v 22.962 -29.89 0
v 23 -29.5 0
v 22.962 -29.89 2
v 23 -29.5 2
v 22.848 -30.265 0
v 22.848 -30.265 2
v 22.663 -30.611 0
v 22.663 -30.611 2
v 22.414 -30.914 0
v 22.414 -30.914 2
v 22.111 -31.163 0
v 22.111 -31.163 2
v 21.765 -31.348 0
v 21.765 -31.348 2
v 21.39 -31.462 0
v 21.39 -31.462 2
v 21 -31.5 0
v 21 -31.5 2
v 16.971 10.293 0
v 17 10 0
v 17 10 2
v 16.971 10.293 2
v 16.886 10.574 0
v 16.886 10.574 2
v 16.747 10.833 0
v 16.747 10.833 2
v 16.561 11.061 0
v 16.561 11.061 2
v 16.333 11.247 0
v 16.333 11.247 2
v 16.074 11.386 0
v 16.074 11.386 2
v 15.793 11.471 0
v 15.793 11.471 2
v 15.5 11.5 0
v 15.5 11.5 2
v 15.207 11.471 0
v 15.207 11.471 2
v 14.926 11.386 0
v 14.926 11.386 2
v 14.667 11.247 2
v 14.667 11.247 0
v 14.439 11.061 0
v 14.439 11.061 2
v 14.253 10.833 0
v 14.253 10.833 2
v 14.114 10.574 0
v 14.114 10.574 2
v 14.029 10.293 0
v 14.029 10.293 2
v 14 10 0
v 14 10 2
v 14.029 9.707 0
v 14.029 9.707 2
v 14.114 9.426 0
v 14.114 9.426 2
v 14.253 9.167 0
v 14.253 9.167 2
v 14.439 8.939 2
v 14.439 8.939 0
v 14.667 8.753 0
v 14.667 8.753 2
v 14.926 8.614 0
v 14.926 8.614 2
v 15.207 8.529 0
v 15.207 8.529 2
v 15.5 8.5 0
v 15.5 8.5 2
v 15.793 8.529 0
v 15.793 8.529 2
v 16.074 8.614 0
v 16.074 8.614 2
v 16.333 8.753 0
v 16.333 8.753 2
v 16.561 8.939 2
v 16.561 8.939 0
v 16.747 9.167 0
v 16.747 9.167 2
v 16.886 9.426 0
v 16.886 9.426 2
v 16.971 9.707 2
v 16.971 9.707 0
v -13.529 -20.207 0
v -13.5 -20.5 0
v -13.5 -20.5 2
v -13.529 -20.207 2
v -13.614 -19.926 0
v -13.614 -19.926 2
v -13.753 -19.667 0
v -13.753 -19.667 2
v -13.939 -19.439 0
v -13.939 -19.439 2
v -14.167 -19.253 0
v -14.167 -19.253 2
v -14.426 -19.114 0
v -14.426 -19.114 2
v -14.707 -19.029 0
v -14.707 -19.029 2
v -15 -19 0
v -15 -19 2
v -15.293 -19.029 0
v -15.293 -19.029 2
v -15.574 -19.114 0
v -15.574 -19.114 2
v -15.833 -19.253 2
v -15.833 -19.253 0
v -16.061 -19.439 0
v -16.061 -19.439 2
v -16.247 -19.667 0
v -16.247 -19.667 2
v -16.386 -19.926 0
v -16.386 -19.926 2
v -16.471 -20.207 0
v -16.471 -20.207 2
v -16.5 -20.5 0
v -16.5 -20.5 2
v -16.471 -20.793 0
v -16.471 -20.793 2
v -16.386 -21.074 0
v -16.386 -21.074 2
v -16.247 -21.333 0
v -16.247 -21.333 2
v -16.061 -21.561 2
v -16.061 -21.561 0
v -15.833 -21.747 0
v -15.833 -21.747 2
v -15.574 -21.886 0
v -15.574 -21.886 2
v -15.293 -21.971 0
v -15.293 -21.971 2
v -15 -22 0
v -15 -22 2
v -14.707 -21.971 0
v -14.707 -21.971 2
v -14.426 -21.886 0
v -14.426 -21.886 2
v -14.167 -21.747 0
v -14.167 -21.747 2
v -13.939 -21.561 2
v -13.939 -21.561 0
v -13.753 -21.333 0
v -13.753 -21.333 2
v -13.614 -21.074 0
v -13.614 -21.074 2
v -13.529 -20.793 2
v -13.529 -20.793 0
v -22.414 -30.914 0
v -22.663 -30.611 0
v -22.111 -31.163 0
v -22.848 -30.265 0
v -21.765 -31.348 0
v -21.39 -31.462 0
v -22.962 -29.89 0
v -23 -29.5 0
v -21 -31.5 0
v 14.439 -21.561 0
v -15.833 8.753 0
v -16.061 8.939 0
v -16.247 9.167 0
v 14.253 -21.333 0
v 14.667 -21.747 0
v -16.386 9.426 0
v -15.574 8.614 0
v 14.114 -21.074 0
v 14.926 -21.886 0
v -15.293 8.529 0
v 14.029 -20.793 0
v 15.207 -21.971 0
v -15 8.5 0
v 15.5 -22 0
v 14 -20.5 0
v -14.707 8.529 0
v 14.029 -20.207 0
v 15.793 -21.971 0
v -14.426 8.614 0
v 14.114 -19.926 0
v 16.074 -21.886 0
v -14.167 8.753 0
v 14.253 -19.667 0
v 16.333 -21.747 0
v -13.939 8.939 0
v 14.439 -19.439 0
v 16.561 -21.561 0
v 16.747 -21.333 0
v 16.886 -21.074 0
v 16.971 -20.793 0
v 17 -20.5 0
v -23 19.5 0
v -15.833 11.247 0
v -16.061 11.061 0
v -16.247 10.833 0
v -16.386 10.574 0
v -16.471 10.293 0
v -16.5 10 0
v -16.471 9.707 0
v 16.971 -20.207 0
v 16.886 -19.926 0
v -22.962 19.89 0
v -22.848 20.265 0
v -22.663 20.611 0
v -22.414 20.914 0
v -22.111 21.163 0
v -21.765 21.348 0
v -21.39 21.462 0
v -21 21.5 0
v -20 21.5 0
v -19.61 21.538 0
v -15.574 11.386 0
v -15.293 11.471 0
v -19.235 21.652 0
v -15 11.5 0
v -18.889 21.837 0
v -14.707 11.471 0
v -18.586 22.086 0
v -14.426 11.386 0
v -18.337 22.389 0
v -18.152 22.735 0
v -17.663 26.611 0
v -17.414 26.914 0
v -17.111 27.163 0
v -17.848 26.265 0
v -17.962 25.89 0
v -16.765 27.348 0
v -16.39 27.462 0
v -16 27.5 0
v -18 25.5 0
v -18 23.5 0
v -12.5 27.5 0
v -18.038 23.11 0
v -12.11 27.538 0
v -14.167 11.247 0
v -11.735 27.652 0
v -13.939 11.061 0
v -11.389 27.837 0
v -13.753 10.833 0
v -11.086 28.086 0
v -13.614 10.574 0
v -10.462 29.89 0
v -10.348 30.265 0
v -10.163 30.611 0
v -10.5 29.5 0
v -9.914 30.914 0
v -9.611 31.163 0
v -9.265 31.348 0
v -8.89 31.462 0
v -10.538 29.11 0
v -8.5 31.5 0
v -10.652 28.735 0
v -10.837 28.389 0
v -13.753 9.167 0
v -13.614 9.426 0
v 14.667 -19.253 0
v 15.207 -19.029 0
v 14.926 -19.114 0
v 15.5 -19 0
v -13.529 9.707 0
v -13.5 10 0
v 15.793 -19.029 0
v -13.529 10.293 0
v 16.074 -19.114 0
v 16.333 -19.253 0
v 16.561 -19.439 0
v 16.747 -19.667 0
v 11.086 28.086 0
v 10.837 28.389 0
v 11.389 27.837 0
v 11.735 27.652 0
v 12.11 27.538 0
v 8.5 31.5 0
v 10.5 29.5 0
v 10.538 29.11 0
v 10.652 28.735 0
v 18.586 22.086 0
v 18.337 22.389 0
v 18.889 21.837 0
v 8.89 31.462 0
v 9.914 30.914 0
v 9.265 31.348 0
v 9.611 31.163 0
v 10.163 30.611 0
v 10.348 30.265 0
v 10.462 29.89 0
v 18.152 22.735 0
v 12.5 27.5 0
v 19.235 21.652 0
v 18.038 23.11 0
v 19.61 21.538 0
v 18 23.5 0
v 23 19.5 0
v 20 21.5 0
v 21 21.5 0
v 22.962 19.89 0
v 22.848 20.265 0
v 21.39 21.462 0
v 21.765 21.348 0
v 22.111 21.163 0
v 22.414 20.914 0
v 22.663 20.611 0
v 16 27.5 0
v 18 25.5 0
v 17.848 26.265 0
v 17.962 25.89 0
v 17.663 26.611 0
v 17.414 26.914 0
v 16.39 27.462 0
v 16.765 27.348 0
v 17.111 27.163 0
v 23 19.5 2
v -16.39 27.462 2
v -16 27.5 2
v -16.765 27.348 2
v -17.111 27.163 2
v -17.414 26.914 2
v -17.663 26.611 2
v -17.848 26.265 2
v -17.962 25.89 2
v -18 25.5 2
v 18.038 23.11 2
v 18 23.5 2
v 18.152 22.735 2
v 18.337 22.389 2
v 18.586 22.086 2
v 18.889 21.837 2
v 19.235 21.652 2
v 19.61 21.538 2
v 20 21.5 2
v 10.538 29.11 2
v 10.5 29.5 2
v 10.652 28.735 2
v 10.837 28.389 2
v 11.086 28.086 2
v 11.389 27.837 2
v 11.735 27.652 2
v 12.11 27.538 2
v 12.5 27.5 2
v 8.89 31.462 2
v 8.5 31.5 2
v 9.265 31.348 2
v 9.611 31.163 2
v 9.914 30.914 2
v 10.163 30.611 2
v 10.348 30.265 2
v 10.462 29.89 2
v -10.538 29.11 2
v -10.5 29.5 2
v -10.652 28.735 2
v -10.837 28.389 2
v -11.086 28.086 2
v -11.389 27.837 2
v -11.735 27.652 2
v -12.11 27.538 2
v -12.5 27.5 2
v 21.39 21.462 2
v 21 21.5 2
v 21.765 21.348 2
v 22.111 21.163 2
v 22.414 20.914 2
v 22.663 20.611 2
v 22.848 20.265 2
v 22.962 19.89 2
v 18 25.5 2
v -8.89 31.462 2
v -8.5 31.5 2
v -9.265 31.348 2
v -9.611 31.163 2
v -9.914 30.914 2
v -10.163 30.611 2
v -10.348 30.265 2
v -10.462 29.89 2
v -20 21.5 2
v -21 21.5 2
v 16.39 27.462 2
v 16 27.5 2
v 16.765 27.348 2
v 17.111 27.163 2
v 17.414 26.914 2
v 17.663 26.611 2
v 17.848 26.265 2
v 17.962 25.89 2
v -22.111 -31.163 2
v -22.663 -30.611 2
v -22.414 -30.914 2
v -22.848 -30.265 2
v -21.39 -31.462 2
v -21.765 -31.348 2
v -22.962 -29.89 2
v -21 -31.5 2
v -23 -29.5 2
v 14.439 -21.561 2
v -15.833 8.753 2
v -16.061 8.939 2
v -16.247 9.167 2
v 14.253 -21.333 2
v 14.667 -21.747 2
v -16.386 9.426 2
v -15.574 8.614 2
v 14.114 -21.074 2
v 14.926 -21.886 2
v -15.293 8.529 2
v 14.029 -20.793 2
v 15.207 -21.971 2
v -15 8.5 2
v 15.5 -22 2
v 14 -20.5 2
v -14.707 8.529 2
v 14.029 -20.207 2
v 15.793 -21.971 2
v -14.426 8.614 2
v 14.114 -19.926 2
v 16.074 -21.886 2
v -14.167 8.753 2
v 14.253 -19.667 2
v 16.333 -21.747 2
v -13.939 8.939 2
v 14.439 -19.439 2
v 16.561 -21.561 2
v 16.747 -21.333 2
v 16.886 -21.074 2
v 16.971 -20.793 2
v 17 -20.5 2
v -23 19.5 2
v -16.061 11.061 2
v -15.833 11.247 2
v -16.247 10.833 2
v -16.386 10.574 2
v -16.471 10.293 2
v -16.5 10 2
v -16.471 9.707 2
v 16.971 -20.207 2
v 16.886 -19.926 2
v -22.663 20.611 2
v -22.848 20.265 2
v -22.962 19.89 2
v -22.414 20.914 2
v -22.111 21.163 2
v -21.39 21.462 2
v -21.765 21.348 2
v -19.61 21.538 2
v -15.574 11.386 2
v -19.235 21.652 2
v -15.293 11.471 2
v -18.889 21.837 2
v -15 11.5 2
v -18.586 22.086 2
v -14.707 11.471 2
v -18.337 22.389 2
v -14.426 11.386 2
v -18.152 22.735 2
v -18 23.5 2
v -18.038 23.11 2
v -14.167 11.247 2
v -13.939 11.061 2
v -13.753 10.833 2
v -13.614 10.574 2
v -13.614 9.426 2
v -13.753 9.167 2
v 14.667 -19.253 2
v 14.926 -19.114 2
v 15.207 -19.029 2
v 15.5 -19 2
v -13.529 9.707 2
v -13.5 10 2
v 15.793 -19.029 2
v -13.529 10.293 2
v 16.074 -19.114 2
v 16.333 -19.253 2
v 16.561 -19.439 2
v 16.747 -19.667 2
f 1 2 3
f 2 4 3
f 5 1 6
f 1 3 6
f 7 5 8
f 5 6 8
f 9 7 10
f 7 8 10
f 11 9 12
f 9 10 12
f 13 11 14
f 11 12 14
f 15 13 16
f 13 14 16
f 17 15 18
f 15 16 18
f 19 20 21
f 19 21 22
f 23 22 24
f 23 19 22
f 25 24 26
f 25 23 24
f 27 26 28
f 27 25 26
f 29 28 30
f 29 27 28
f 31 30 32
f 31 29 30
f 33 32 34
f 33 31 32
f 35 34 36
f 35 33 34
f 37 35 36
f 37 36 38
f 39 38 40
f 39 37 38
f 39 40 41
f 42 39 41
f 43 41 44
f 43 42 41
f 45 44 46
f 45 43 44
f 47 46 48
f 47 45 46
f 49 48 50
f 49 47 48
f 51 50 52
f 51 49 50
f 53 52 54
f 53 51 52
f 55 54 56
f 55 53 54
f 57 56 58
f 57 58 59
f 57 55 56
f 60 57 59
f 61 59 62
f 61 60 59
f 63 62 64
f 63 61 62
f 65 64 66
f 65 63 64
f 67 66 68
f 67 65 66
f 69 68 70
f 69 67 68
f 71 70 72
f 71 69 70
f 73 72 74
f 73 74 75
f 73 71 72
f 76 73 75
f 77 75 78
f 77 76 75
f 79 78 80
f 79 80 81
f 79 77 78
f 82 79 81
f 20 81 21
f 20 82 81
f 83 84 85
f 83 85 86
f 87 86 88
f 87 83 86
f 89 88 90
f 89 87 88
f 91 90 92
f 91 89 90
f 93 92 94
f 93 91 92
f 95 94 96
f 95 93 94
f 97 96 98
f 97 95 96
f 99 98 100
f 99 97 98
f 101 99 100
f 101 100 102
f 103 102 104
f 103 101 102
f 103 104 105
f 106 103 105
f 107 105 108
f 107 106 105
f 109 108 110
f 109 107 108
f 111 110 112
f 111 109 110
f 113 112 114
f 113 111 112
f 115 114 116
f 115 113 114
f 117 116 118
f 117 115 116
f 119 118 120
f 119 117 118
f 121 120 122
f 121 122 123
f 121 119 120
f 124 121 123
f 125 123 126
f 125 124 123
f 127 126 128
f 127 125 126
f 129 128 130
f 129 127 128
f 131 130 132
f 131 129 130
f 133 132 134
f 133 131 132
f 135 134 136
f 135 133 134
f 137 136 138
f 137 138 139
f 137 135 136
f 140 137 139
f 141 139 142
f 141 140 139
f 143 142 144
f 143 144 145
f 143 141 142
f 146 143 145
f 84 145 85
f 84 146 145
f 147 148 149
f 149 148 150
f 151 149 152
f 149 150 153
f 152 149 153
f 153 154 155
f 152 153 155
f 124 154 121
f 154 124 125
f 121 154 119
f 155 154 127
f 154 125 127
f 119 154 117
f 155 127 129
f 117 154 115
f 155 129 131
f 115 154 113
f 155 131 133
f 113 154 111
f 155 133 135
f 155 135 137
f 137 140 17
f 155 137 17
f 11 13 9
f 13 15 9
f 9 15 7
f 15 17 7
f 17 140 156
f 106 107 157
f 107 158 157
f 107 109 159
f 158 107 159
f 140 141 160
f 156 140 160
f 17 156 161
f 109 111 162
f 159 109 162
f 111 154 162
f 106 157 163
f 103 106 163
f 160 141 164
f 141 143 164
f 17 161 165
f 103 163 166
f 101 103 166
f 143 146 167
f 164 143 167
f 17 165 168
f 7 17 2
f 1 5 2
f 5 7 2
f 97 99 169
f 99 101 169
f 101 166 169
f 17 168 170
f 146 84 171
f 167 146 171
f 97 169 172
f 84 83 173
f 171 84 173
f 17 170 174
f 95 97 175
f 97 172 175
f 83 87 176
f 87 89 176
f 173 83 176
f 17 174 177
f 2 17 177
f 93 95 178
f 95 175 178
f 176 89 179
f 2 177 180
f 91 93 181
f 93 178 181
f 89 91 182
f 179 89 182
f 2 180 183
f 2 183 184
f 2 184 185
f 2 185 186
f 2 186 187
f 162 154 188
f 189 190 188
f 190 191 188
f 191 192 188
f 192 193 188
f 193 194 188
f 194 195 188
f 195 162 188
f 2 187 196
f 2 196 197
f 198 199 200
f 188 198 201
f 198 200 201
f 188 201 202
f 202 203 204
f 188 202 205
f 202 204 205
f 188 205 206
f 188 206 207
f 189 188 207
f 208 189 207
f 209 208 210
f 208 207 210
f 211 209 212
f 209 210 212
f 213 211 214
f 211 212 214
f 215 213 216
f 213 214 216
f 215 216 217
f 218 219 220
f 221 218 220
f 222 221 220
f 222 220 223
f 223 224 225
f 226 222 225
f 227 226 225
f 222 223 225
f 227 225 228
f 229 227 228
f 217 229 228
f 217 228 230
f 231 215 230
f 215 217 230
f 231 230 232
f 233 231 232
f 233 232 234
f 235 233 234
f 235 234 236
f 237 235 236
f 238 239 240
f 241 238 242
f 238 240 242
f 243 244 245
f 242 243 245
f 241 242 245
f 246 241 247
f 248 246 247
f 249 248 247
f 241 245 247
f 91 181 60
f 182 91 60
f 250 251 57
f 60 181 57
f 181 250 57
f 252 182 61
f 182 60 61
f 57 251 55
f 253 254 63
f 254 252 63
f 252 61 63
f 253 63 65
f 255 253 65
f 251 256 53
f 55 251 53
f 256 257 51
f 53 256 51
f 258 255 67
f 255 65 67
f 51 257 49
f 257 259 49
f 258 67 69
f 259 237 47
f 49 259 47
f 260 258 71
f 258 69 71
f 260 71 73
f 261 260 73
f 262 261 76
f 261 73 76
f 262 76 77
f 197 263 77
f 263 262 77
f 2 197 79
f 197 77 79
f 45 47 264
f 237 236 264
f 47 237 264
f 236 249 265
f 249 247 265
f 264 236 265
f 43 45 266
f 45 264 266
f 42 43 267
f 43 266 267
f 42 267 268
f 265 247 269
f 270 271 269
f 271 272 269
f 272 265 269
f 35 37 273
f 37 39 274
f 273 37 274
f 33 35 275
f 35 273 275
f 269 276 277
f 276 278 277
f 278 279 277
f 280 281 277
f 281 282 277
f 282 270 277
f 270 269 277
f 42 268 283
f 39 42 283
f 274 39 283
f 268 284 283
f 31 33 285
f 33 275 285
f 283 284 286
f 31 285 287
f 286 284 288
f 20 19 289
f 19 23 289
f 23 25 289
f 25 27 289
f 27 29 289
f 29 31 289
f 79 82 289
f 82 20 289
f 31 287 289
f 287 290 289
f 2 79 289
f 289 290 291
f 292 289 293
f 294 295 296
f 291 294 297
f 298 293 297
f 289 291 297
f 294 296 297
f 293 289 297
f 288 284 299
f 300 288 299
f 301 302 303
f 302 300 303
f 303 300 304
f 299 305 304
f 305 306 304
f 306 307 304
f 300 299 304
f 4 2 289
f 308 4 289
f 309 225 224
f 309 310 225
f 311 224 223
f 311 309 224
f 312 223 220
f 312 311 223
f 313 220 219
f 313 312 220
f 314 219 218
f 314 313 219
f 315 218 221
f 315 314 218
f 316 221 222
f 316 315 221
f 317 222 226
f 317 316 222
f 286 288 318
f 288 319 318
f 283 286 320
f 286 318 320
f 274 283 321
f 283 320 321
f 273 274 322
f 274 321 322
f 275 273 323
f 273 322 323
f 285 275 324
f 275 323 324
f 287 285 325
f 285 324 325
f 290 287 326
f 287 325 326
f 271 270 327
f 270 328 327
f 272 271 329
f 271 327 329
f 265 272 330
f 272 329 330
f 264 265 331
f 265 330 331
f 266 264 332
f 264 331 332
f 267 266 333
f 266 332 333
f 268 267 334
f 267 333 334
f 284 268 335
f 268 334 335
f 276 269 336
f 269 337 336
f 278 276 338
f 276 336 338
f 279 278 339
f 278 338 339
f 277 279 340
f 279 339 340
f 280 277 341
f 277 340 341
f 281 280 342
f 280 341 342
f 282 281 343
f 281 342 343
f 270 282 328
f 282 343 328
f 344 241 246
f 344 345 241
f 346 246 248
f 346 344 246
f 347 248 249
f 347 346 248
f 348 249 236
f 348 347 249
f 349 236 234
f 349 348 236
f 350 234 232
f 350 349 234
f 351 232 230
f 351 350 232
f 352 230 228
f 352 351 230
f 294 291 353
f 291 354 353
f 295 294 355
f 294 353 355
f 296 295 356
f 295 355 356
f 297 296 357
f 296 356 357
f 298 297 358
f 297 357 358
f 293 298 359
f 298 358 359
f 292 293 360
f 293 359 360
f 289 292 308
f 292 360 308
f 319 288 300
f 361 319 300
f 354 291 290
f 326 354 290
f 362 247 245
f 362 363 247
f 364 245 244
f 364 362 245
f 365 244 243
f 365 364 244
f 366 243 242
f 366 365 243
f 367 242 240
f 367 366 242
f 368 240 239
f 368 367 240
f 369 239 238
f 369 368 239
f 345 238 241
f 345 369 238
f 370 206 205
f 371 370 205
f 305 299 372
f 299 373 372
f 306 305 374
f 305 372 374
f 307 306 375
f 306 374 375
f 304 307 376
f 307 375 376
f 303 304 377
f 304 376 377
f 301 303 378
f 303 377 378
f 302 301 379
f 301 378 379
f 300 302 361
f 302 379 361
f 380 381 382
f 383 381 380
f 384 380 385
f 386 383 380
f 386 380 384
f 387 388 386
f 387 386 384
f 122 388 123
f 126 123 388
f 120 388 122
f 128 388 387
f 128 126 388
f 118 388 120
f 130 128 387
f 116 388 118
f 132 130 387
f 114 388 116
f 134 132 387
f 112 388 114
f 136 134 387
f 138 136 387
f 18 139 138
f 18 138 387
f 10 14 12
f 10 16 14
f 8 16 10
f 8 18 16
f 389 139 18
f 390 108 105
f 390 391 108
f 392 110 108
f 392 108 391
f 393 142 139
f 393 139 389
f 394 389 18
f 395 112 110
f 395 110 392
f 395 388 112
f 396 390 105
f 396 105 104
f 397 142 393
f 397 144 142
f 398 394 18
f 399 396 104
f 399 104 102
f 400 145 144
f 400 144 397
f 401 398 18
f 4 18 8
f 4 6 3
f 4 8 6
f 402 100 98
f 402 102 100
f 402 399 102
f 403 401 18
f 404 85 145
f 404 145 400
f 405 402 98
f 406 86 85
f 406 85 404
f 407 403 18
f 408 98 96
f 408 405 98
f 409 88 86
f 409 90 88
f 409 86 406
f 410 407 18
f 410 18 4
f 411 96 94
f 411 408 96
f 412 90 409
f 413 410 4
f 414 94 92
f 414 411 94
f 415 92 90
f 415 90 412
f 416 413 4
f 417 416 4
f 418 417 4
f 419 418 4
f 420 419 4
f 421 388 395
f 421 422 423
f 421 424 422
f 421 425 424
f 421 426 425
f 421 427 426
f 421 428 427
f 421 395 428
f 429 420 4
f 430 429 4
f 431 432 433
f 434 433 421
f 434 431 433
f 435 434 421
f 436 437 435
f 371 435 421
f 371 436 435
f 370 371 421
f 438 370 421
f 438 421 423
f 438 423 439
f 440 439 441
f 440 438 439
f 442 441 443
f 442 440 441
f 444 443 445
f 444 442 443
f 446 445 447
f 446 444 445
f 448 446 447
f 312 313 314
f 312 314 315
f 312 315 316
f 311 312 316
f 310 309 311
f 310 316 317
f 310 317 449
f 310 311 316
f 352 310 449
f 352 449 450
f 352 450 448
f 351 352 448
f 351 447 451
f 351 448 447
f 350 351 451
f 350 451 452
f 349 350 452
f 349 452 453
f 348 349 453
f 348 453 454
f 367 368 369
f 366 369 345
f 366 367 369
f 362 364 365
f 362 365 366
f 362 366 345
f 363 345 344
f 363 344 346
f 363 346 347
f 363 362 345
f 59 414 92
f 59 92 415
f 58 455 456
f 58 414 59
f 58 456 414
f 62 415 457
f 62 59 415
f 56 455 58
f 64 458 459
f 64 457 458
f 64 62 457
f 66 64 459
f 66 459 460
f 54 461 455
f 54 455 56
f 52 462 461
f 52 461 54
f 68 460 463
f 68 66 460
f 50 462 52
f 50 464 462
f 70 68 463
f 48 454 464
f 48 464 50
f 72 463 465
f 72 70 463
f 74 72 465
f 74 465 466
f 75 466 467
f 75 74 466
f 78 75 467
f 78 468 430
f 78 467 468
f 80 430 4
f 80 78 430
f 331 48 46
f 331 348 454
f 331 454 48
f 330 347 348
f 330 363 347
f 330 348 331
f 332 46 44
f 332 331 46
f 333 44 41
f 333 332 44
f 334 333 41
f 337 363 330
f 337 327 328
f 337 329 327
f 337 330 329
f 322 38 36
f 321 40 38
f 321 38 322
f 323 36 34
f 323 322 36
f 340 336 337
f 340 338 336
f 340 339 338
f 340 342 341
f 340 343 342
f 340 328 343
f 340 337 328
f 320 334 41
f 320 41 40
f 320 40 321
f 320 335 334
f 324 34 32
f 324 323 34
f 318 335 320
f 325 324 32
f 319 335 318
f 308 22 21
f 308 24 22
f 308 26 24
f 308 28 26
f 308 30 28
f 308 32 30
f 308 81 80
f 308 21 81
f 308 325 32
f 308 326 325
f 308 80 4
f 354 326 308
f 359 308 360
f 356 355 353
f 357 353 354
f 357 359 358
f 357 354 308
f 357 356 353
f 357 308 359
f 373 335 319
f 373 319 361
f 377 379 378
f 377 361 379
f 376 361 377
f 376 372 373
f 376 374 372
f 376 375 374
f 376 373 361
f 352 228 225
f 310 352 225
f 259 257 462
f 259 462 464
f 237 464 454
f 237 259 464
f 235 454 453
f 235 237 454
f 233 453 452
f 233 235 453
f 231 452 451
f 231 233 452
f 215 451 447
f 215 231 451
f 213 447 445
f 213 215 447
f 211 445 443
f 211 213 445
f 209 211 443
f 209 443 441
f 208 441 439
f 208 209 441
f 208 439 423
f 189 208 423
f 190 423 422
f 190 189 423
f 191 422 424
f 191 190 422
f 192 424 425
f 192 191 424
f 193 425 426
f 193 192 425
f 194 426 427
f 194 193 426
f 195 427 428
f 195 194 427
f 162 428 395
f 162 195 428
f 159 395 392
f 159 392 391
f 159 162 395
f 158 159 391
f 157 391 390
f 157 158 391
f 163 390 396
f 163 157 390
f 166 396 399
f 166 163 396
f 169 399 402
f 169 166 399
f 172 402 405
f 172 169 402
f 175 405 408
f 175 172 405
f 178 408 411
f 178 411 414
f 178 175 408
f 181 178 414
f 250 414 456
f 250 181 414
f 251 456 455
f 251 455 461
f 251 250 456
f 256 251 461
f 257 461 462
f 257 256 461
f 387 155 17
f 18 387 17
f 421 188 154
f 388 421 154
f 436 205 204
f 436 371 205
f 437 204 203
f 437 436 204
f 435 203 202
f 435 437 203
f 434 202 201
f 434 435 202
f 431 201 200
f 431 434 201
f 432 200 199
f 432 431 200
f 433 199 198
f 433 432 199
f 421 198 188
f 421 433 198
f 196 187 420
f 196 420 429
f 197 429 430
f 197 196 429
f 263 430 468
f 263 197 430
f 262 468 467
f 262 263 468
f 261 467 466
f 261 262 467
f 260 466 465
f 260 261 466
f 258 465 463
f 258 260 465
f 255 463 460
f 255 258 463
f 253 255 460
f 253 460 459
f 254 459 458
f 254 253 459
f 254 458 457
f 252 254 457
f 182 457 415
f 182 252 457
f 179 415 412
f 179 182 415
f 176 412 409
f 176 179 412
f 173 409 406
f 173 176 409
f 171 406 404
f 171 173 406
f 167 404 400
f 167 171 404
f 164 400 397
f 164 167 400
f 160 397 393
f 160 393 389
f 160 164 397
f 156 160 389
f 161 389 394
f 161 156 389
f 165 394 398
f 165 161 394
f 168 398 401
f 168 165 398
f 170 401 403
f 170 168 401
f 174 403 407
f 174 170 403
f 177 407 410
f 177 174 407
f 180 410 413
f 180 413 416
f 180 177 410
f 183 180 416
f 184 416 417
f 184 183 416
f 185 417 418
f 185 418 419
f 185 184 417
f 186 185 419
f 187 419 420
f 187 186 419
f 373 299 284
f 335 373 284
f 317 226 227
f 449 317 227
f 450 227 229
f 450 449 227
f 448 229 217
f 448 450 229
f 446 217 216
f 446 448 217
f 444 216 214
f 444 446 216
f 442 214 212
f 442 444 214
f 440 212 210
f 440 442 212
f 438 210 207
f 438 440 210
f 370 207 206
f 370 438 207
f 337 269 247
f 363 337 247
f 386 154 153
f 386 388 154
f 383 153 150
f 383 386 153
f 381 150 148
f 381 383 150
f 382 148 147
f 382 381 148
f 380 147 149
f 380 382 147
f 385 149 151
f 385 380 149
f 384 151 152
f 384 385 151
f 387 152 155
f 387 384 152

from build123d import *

# Parameters (mm, degrees)
F0_R     = 1.5
F1_DEPTH = 2
F2_R     = 1.99999


# Not quite as in the source:
# - a fillet or chamfer is up to 0.001 mm smaller than in the source, because OpenCascade refuses the exact size


with BuildPart() as f1:
    # F0 (on Top) → F1 (new body)
    with BuildSketch(Plane.XY):
        Polygon((10.5, 31.5), (-10.5, 31.5), (-10.5, 27.5), (-18, 27.5), (-18, 21.5), (-23, 21.5), (-23, -31.5), (23, -31.5), (23, 21.5), (18, 21.5), (18, 27.5), (10.5, 27.5), align=None)
        with Locations((-15, -20.5)):
            Circle(F0_R, mode=Mode.SUBTRACT)
        with Locations((15.5, -20.5)):
            Circle(F0_R, mode=Mode.SUBTRACT)
        with Locations((-15, 10)):
            Circle(F0_R, mode=Mode.SUBTRACT)
        with Locations((15.5, 10)):
            Circle(F0_R, mode=Mode.SUBTRACT)
    extrude(amount=F1_DEPTH)

    # F2 (radius 2 in the source; OpenCascade refuses exactly that, so slightly less here)
    f2_edges = [f1.edges().sort_by_distance(p)[0] for p in [
        (10.5, 31.5, 1),
        (23, 21.5, 1),
        (18, 27.5, 1),
        (18, 21.5, 1),
        (10.5, 27.5, 1),
        (-10.5, 31.5, 1),
        (-10.5, 27.5, 1),
        (-18, 27.5, 1),
        (-18, 21.5, 1),
        (-23, 21.5, 1),
        (-23, -31.5, 1),
        (23, -31.5, 1),
    ]]
    fillet(f2_edges, radius=F2_R)


solid = f1.part
